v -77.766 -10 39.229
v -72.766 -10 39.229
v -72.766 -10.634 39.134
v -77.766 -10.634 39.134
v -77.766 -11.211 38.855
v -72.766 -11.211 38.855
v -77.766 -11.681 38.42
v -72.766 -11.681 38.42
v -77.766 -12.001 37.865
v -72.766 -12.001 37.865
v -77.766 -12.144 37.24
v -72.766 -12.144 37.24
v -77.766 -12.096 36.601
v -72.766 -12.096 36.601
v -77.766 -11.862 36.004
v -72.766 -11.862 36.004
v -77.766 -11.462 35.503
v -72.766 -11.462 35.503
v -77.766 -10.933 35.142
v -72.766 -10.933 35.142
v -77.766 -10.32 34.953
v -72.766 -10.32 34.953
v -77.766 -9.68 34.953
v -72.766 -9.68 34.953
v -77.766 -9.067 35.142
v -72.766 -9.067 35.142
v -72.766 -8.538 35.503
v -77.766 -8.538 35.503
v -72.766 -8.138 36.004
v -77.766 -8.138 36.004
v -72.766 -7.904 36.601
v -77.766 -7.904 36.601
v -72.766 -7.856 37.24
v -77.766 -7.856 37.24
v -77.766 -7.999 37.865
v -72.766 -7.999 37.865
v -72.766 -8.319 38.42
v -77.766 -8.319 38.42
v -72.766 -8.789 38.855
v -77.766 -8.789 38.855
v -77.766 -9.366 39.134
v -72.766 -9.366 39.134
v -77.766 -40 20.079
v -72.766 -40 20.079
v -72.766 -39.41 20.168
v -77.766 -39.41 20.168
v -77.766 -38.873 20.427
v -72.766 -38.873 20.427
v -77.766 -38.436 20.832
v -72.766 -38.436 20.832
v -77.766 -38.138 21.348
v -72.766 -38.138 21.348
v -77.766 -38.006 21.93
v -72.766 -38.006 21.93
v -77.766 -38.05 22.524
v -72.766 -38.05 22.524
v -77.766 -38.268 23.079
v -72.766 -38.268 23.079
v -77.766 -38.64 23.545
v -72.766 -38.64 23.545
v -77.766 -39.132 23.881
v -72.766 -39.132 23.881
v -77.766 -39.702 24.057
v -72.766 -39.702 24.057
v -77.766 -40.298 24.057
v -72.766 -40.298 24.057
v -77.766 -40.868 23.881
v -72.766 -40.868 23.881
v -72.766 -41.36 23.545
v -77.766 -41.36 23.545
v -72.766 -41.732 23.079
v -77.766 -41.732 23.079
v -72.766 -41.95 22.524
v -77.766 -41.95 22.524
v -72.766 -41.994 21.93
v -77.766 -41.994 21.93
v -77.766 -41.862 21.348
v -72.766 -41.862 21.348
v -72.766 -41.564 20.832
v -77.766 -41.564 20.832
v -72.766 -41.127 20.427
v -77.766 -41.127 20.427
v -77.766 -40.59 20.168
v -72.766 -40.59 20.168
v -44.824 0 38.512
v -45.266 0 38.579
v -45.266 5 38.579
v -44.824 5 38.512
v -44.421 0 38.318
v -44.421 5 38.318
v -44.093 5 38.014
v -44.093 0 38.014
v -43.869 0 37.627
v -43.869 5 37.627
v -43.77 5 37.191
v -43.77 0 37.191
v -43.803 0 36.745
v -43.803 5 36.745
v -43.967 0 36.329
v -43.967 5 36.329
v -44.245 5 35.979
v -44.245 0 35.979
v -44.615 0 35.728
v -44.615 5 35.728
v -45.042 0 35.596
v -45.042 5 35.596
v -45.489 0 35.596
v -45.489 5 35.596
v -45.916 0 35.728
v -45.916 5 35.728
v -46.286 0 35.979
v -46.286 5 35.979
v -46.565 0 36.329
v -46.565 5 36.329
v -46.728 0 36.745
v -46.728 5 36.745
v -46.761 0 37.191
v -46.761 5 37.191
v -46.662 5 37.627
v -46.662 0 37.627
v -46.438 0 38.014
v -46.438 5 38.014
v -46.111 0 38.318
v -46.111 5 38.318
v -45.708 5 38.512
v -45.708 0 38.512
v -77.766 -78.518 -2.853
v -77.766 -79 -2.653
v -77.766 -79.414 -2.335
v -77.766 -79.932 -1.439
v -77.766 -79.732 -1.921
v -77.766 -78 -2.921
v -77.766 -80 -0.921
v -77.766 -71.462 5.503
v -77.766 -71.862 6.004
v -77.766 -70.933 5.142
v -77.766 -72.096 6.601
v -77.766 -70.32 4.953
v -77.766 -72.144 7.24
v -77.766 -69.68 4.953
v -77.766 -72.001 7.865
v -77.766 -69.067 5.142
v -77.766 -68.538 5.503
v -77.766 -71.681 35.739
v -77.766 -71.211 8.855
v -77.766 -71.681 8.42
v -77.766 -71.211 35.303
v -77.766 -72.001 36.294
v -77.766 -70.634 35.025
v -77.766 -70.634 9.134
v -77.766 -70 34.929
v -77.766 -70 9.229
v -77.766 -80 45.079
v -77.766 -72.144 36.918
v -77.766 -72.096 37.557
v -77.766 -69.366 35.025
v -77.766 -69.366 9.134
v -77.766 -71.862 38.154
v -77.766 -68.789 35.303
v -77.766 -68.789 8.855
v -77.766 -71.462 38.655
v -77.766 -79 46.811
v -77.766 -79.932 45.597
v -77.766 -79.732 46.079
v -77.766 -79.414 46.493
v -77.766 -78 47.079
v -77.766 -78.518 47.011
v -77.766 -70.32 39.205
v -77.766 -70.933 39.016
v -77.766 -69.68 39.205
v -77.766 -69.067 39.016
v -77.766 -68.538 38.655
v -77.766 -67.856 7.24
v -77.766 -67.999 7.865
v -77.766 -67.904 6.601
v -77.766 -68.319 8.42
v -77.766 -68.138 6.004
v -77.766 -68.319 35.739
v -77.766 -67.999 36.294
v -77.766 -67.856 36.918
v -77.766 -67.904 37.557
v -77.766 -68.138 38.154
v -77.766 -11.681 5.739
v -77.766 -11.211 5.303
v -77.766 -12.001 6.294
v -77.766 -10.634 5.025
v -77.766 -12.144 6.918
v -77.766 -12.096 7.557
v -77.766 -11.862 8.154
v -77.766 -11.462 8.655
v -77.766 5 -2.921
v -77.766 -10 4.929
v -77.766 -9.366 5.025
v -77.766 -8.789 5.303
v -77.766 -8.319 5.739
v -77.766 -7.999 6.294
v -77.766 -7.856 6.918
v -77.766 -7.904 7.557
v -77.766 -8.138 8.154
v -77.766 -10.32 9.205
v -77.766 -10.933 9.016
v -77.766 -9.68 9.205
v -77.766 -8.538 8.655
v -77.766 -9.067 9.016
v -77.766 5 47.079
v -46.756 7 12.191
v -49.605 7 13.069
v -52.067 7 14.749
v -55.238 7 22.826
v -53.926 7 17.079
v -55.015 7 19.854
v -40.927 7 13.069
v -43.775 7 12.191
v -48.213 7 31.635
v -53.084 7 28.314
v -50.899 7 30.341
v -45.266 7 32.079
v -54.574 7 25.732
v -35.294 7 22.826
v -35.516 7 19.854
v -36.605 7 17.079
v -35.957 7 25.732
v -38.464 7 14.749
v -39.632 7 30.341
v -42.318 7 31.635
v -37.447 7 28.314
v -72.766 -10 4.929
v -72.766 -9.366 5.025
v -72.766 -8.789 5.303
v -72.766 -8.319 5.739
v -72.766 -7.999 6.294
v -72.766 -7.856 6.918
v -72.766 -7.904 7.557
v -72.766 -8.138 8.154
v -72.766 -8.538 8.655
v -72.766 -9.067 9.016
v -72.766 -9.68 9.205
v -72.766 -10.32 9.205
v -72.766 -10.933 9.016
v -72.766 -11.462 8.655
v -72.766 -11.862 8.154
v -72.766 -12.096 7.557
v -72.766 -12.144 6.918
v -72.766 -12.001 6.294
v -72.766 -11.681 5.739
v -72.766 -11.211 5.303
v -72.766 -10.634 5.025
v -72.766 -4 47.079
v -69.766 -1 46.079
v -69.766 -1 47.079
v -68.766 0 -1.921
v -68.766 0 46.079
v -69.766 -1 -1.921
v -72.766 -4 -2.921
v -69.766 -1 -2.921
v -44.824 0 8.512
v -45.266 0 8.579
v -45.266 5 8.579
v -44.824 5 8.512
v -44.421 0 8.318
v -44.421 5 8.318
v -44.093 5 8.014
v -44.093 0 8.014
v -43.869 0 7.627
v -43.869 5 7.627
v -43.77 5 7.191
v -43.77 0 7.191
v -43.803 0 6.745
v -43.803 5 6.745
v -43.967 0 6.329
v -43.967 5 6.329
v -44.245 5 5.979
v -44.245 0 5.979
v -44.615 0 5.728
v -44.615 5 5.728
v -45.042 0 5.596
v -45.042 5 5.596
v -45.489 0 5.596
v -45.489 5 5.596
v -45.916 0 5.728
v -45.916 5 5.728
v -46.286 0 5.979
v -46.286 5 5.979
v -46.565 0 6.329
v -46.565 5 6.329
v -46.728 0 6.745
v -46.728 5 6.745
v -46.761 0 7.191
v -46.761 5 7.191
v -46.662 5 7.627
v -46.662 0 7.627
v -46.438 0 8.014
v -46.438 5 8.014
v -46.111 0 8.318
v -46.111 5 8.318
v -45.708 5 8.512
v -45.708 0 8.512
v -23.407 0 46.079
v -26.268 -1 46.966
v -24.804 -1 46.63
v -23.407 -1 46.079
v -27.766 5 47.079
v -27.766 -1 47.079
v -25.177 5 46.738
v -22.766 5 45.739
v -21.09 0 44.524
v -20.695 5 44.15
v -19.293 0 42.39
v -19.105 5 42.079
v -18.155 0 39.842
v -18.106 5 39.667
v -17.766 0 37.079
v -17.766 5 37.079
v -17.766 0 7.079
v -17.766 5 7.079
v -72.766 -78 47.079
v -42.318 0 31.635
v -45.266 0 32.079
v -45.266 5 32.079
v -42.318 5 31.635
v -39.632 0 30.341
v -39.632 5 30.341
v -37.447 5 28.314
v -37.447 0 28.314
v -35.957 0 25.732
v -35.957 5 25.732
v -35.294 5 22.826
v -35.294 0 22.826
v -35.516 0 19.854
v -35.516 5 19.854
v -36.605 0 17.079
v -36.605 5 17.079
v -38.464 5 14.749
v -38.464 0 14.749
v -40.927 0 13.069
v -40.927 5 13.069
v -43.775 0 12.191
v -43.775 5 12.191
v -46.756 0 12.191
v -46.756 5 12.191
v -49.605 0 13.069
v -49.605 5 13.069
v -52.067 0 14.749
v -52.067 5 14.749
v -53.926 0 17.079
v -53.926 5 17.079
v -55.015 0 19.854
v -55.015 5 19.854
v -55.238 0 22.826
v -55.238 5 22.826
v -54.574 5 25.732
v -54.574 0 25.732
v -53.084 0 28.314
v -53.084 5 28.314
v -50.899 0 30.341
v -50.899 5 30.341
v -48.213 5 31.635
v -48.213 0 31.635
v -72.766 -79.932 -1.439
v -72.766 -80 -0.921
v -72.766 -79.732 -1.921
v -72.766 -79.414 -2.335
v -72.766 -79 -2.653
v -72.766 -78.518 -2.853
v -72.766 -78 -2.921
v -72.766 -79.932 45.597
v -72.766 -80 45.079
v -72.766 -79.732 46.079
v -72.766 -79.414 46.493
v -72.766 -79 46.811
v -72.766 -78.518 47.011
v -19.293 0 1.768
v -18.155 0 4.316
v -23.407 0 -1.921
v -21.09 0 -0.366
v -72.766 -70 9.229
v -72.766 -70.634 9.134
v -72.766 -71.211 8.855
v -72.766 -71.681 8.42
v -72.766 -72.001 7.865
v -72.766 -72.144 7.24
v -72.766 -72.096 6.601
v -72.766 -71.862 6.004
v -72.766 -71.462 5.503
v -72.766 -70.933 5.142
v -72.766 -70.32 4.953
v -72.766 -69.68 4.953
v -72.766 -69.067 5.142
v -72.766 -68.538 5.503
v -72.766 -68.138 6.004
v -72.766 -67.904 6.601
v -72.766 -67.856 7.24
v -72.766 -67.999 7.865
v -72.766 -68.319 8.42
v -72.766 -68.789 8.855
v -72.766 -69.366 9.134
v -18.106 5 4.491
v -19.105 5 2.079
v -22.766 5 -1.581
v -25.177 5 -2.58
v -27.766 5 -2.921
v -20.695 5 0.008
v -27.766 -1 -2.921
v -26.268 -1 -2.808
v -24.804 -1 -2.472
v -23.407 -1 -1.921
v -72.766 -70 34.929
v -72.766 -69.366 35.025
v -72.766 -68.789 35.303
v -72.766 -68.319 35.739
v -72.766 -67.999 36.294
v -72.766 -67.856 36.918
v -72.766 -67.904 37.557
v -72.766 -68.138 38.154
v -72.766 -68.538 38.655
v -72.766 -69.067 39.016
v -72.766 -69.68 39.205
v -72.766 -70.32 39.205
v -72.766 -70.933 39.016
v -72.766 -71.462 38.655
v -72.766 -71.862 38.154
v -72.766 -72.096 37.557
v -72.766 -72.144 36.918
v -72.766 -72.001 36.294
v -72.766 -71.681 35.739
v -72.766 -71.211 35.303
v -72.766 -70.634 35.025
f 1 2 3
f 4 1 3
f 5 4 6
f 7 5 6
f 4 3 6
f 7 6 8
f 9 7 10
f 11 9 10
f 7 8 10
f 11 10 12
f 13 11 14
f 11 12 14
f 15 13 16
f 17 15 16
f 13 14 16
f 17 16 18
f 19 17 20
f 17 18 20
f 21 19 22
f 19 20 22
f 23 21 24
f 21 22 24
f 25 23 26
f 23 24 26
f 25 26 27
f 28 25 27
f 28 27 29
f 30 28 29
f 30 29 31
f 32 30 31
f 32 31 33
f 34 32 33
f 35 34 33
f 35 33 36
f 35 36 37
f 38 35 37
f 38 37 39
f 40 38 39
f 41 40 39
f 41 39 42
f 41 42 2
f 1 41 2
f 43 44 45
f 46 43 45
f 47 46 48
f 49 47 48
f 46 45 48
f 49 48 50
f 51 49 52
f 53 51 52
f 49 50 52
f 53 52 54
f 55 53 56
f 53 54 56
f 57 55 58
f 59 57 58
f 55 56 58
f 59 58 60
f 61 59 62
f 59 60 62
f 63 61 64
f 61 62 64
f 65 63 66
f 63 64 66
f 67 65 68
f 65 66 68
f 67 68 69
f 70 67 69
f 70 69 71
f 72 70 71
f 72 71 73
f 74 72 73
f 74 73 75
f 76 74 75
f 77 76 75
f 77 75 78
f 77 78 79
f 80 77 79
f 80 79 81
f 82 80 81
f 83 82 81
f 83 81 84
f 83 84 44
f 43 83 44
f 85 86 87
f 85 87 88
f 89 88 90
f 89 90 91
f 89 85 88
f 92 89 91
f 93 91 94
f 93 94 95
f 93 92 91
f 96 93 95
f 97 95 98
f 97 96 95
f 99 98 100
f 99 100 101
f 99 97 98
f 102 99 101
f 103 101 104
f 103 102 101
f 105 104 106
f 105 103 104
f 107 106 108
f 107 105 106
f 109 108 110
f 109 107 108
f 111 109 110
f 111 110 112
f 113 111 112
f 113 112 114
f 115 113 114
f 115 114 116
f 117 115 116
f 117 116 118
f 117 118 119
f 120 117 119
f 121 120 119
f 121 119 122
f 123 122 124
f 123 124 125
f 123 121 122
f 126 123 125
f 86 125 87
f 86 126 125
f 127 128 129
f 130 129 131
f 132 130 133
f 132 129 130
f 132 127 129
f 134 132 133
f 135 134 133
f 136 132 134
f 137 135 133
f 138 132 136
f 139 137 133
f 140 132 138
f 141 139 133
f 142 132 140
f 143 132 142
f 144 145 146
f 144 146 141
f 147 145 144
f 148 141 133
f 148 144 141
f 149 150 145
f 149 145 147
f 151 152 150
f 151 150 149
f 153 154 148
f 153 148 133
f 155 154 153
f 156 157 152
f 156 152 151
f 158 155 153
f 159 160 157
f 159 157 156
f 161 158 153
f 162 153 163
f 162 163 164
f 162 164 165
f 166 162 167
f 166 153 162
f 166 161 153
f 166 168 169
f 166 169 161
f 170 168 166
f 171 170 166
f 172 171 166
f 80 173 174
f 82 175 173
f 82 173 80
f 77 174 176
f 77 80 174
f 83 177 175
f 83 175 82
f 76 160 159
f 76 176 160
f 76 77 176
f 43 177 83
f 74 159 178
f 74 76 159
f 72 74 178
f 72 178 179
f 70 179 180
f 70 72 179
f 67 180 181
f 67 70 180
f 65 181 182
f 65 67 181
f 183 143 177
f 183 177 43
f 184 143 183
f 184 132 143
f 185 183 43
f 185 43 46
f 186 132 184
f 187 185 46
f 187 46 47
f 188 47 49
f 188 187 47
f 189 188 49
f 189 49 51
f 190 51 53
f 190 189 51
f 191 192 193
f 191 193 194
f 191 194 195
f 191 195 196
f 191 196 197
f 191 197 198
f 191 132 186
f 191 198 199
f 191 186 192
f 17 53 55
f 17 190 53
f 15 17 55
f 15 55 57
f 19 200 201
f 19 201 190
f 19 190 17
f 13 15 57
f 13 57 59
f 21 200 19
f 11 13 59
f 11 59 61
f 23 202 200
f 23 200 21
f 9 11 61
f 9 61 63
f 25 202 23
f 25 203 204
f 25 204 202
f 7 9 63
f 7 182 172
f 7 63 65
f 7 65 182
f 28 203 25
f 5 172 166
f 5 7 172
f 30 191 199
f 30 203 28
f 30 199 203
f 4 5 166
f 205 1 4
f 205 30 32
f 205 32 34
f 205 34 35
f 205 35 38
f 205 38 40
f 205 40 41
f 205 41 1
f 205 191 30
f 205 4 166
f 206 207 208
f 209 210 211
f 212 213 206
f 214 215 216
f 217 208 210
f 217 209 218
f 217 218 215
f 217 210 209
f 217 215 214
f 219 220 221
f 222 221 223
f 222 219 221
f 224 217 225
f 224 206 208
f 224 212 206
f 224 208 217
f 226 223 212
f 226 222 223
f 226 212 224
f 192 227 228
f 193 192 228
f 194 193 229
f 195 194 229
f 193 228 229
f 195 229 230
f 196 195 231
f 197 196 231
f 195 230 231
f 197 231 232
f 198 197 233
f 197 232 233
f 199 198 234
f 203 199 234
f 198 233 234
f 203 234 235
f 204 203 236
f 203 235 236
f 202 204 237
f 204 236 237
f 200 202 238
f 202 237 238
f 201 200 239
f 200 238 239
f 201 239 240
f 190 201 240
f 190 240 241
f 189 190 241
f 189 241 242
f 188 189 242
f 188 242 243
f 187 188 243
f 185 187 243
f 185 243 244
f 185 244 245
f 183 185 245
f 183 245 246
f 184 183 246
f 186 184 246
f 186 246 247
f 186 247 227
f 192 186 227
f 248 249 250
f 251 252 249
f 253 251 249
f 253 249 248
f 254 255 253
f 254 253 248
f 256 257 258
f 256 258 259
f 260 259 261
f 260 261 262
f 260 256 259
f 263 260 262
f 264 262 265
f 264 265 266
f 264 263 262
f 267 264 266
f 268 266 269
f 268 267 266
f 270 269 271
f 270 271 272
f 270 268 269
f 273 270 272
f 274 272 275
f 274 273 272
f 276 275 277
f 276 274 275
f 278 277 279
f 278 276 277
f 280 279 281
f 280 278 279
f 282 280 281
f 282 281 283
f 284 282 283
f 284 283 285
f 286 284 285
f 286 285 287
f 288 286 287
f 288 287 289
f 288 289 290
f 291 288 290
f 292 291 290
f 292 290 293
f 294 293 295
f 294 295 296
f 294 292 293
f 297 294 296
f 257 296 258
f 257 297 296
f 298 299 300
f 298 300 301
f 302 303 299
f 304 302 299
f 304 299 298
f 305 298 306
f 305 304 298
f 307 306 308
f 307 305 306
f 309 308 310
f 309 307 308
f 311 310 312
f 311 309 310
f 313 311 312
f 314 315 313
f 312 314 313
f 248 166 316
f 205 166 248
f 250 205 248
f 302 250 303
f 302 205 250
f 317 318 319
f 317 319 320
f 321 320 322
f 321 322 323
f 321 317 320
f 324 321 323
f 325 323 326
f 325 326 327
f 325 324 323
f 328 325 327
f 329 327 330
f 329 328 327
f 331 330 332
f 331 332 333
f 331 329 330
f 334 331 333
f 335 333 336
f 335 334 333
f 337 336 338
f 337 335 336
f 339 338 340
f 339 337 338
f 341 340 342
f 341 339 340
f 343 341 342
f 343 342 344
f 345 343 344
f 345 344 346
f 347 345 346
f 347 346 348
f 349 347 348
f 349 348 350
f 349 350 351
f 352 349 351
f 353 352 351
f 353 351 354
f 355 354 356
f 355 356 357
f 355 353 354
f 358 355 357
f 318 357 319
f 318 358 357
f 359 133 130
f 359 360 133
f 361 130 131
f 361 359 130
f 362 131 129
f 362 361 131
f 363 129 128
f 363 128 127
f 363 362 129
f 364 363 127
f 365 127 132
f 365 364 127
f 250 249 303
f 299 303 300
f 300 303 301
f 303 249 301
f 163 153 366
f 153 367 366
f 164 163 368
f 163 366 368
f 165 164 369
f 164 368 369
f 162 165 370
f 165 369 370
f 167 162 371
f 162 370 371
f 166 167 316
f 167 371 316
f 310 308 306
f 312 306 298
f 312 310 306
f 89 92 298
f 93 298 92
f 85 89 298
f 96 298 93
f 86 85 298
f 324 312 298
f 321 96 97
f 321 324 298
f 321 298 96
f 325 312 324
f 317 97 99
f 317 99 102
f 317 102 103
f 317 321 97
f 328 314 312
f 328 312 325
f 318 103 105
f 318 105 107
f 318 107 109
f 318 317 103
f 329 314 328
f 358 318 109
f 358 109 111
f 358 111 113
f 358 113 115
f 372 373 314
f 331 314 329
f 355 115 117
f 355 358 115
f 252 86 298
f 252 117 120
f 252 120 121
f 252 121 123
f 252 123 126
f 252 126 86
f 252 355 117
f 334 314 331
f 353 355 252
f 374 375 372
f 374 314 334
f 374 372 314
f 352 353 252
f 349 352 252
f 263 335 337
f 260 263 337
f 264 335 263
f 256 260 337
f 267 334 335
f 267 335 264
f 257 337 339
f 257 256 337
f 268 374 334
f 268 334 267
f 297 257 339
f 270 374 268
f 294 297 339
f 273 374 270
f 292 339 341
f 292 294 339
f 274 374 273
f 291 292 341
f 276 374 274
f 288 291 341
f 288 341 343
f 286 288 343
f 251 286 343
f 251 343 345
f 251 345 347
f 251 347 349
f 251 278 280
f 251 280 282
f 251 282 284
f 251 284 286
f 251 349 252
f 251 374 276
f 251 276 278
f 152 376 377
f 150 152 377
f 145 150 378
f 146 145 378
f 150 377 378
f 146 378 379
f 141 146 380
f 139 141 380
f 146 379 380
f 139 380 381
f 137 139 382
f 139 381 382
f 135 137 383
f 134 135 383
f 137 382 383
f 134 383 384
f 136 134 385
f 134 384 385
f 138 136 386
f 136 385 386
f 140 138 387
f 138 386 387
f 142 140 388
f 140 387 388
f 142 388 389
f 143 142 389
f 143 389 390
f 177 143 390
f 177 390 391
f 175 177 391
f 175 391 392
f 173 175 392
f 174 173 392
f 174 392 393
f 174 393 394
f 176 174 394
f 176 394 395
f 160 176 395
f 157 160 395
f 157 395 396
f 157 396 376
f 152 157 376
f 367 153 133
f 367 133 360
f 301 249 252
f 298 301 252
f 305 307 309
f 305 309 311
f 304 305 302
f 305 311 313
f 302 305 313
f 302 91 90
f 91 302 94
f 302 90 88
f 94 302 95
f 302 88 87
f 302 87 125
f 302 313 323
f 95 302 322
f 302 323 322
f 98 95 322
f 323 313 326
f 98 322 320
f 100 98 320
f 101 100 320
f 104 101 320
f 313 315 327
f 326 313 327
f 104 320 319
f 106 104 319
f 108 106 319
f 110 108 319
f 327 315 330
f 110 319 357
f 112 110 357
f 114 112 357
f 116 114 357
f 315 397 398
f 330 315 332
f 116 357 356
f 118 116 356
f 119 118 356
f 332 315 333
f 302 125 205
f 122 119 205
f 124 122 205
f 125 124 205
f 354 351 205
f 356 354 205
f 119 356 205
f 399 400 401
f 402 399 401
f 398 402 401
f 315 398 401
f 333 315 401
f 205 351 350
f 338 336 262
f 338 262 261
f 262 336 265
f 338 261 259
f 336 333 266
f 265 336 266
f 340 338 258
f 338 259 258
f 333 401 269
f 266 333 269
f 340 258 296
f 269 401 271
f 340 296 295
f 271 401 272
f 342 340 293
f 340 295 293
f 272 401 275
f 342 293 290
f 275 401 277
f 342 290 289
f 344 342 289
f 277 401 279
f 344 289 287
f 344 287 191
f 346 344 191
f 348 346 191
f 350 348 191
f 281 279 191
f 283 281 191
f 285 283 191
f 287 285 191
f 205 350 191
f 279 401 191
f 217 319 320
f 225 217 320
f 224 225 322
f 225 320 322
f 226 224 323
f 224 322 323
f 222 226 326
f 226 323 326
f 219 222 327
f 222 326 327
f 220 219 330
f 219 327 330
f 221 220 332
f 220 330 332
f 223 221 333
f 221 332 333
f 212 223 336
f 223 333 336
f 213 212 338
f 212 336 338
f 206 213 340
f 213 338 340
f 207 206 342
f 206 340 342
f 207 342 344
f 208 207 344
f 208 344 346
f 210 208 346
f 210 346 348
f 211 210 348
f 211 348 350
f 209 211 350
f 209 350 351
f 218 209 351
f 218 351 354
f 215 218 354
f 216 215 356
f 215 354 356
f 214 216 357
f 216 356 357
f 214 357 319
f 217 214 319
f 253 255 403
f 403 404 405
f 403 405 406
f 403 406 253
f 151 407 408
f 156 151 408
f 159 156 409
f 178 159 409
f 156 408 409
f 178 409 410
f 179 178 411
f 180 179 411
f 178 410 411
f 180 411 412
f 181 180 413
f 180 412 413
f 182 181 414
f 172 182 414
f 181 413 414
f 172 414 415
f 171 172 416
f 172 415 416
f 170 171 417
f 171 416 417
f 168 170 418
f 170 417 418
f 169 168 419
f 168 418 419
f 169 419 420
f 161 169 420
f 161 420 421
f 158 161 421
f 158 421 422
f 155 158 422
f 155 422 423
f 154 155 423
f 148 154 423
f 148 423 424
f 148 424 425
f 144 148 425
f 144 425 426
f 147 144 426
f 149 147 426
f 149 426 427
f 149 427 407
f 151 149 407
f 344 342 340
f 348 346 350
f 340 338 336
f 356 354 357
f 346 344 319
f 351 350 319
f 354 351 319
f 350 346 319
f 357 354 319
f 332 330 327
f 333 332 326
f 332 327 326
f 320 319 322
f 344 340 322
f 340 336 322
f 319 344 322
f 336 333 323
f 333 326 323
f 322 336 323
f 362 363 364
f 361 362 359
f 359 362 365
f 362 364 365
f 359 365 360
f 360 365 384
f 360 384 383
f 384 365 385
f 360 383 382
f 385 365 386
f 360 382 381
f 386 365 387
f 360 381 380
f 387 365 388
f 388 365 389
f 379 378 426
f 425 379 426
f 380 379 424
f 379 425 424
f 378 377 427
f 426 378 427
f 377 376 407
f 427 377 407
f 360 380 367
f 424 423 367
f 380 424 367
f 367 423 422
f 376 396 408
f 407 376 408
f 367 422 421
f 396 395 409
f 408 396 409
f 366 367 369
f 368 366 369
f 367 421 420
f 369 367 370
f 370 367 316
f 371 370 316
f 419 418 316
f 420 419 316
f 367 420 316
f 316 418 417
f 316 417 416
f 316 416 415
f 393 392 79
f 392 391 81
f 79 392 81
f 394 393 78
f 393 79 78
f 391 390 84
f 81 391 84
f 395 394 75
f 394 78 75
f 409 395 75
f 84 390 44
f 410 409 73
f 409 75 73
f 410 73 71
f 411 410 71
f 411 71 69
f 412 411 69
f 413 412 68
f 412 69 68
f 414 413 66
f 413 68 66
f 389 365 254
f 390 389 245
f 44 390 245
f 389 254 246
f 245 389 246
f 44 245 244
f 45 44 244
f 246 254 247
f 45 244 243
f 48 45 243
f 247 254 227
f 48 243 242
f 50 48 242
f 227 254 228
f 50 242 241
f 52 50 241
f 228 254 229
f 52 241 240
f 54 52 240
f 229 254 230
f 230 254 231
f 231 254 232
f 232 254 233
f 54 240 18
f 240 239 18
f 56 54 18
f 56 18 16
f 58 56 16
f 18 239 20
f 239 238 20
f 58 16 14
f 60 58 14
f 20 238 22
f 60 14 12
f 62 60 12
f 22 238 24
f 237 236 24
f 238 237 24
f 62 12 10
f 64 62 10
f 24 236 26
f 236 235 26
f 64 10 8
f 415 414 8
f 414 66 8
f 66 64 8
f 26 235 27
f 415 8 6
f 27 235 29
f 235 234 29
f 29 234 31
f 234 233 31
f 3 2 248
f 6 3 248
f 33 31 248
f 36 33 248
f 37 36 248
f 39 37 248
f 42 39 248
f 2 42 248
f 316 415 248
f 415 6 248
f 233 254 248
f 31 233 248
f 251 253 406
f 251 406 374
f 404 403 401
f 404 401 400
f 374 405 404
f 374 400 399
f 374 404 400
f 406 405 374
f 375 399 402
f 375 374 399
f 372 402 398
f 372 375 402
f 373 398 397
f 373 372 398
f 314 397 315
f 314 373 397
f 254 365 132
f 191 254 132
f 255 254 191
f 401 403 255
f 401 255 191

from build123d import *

# Parameters (mm, degrees)
SKETCH_1_R          = 1.5
SKETCH_1_R_2        = 10
EXTRUDE_2_DEPTH     = 5
SKETCH_3_W          = 5
SKETCH_3_H          = 50
EXTRUDE_4_DEPTH     = 80
SKETCH_4_R          = 2
CUT_EXTRUDE_1_DEPTH = 40
SKETCH_7_R          = 2.15
CUT_EXTRUDE_2_DEPTH = 120.337479599
CUT_EXTRUDE_3_DEPTH = 10
FILLET_2_R          = 2
SKETCH_13_W         = 50
SKETCH_13_H         = 4
EXTRUDE_5_DEPTH     = 4
CUT_EXTRUDE_4_DEPTH = 123.259965047
SKETCH_16_W         = 1
SKETCH_16_H         = 1
EXTRUDE_6_DEPTH     = 1
SKETCH_17_W         = 1
SKETCH_17_H         = 1
EXTRUDE_7_DEPTH     = 55
SKETCH_19_W         = 1
SKETCH_19_H         = 1
EXTRUDE_8_DEPTH     = 1
SKETCH_20_W         = 1
SKETCH_20_H         = 1
EXTRUDE_9_DEPTH     = 55
FILLET_3_R          = 10
SKETCH_21_R         = 10
EXTRUDE_10_DEPTH    = 2


with BuildPart() as part:
    # 草图1 → 凸台-拉伸2 (new body)
    with BuildSketch(Plane(origin=(0, 0, 0), x_dir=(1, 0, 0), z_dir=(0, 1, 0))):
        with BuildLine():
            Line((-77.765667575, 2.920980926), (-12.765667575, 2.920980926))
            ThreePointArc((-12.765667575, 2.920980926), (-2.159065857, -1.472417356), (2.234332425, -12.079019074))
            Line((2.234332425, -12.079019074), (2.234332425, -32.079019074))
            ThreePointArc((2.234332425, -32.079019074), (-2.159065857, -42.685620791), (-12.765667575, -47.079019074))
            Line((-12.765667575, -47.079019074), (-77.765667575, -47.079019074))
            Line((-77.765667575, -47.079019074), (-77.765667575, 2.920980926))
        make_face()
        with Locations(Location((-45.265667575, -37.079019074, 0), (0, 0, 270))):
            Circle(SKETCH_1_R, mode=Mode.SUBTRACT)
        with Locations(Location((-45.265667575, -22.079019074, 0), (0, 0, 270))):
            Circle(SKETCH_1_R_2, mode=Mode.SUBTRACT)
        with Locations(Location((-45.265667575, -7.079019074, 0), (0, 0, 270))):
            Circle(SKETCH_1_R, mode=Mode.SUBTRACT)
    extrude(amount=EXTRUDE_2_DEPTH)

    # 草图3 → 凸台-拉伸4 (add)
    with BuildSketch(Plane.XZ):
        with Locations((-75.265667575, 22.079019074)):
            Rectangle(SKETCH_3_W, SKETCH_3_H)
    extrude(amount=EXTRUDE_4_DEPTH)

    # 草图4 → 切除-拉伸1 (cut)
    with BuildSketch(Plane(origin=(-72.765667575, 0, 0), x_dir=(0, 0, -1), z_dir=(1, 0, 0))):
        with Locations((-22.079019074, -40)):
            Circle(SKETCH_4_R)
    extrude(amount=-CUT_EXTRUDE_1_DEPTH, mode=Mode.SUBTRACT)

    # 草图7 → 切除-拉伸2 (cut, through all)
    with BuildSketch(Plane(origin=(-72.765667575, 0, 0), x_dir=(0, 0, -1), z_dir=(1, 0, 0))):
        with Locations((-7.079019074, -10)):
            Circle(SKETCH_7_R)
        with Locations(Location((-37.079019074, -10, 0), (0, 0, 180))):
            Circle(SKETCH_7_R)
        with Locations(Location((-7.079019074, -70, 0), (0, 0, 180))):
            Circle(SKETCH_7_R)
        with Locations((-37.079019074, -70)):
            Circle(SKETCH_7_R)
    extrude(amount=-CUT_EXTRUDE_2_DEPTH, mode=Mode.SUBTRACT)

    # 草图12 → 切除-拉伸3 (cut)
    with BuildSketch(Plane.XZ):
        with BuildLine():
            Line((-17.765667575, 47.079019074), (-17.765667575, 22.079019074))
            Line((-17.765667575, 22.079019074), (-17.765667575, -2.920980926))
            Line((-17.765667575, -2.920980926), (-12.765667575, -2.920980926))
            ThreePointArc((-12.765667575, -2.920980926), (-2.159065857, 1.472417356), (2.234332425, 12.079019074))
            Line((2.234332425, 12.079019074), (2.234332425, 32.079019074))
            ThreePointArc((2.234332425, 32.079019074), (-2.159065857, 42.685620791), (-12.765667575, 47.079019074))
            Line((-12.765667575, 47.079019074), (-17.765667575, 47.079019074))
        make_face()
    extrude(amount=-CUT_EXTRUDE_3_DEPTH, mode=Mode.SUBTRACT)

    # 圆角2
    fillet_2_edges = [part.edges().sort_by_distance(p)[0] for p in [
        (-75.265667575, -80, -2.920980926),
        (-75.265667575, -80, 47.079019074),
    ]]
    fillet(fillet_2_edges, radius=FILLET_2_R)

    # 草图13 → 凸台-拉伸5 (add)
    with BuildSketch(Plane(origin=(-72.765667575, 0, 0), x_dir=(0, 0, -1), z_dir=(1, 0, 0))):
        with Locations((-22.079019074, -2)):
            Rectangle(SKETCH_13_W, SKETCH_13_H)
    extrude(amount=EXTRUDE_5_DEPTH)

    # 草图14 → 切除-拉伸4 (cut, through all)
    with BuildSketch(Plane(origin=(0, 0, -2.920980926), x_dir=(-1, 0, 0), z_dir=(0, 0, -1))):
        Polygon((68.765667575, 0), (72.765667575, -4), (68.765667575, -4), align=None)
    extrude(amount=-CUT_EXTRUDE_4_DEPTH, mode=Mode.SUBTRACT)

    # 草图16 → 凸台-拉伸6 (add)
    with BuildSketch(Plane.XZ):
        with Locations((-18.265667575, -2.420980926)):
            Rectangle(SKETCH_16_W, SKETCH_16_H)
    extrude(amount=EXTRUDE_6_DEPTH)

    # 草图17 → 凸台-拉伸7 (add)
    with BuildSketch(Plane.ZY.offset(18.765667575)):
        with Locations((-2.420980926, -0.5)):
            Rectangle(SKETCH_17_W, SKETCH_17_H)
    extrude(amount=EXTRUDE_7_DEPTH)

    # 草图19 → 凸台-拉伸8 (add)
    with BuildSketch(Plane.XZ):
        with Locations((-18.265667575, 46.579019074)):
            Rectangle(SKETCH_19_W, SKETCH_19_H)
    extrude(amount=EXTRUDE_8_DEPTH)

    # 草图20 → 凸台-拉伸9 (add)
    with BuildSketch(Plane.ZY.offset(18.765667575)):
        with Locations((46.579019074, -0.5)):
            Rectangle(SKETCH_20_W, SKETCH_20_H)
    extrude(amount=EXTRUDE_9_DEPTH)

    # 圆角3
    fillet_3_edges = [part.edges().sort_by_distance(p)[0] for p in [
        (-17.765667575, 2, -2.920980926),
        (-17.765667575, 2, 47.079019074),
    ]]
    fillet(fillet_3_edges, radius=FILLET_3_R)


with BuildPart() as body_2:
    # 草图21 → 凸台-拉伸10 (new body)
    with BuildSketch(Plane(origin=(0, 5, 0), x_dir=(1, 0, 0), z_dir=(0, 1, 0))):
        with Locations(Location((-45.265667575, -22.079019074, 0), (0, 0, 270))):
            Circle(SKETCH_21_R)
    extrude(amount=EXTRUDE_10_DEPTH)


solid = Compound([part.part, body_2.part])
